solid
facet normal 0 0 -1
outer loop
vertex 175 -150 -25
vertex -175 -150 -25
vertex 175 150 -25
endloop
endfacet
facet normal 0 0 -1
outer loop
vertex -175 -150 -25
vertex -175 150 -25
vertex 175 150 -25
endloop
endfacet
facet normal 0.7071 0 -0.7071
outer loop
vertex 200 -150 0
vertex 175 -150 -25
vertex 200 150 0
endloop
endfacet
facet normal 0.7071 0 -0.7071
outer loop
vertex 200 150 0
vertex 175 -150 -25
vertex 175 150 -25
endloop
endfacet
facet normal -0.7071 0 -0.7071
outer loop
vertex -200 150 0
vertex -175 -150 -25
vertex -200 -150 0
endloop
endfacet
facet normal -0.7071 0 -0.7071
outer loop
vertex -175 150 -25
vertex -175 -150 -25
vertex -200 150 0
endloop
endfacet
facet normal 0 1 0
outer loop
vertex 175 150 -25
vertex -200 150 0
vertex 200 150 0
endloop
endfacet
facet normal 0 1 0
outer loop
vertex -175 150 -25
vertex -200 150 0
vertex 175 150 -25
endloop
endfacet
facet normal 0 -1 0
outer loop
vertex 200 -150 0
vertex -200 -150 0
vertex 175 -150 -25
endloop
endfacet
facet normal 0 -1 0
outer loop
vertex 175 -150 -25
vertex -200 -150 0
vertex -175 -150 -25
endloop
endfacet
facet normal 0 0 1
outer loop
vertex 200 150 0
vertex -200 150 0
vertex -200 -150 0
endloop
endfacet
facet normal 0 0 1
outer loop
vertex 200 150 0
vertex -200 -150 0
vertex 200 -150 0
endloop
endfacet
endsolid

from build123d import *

# Parameters (mm, degrees)
F0_W     = 400
F0_H     = 300
F1_DEPTH = 25
F2_SIZE  = 24.99999


# Not quite as in the source:
# - a fillet or chamfer is up to 0.001 mm smaller than in the source, because OpenCascade refuses the exact size


with BuildPart() as f1:
    # F0 (on Top) → F1 (new body)
    with BuildSketch(Plane.XY):
        Rectangle(F0_W, F0_H)
    extrude(amount=-F1_DEPTH)

    # F2 (size 25 in the source; OpenCascade refuses exactly that, so slightly less here)
    f2_edges = [f1.edges().sort_by_distance(p)[0] for p in [
        (-200, 0, -25),
        (200, 0, -25),
    ]]
    chamfer(f2_edges, length=F2_SIZE)


solid = f1.part
